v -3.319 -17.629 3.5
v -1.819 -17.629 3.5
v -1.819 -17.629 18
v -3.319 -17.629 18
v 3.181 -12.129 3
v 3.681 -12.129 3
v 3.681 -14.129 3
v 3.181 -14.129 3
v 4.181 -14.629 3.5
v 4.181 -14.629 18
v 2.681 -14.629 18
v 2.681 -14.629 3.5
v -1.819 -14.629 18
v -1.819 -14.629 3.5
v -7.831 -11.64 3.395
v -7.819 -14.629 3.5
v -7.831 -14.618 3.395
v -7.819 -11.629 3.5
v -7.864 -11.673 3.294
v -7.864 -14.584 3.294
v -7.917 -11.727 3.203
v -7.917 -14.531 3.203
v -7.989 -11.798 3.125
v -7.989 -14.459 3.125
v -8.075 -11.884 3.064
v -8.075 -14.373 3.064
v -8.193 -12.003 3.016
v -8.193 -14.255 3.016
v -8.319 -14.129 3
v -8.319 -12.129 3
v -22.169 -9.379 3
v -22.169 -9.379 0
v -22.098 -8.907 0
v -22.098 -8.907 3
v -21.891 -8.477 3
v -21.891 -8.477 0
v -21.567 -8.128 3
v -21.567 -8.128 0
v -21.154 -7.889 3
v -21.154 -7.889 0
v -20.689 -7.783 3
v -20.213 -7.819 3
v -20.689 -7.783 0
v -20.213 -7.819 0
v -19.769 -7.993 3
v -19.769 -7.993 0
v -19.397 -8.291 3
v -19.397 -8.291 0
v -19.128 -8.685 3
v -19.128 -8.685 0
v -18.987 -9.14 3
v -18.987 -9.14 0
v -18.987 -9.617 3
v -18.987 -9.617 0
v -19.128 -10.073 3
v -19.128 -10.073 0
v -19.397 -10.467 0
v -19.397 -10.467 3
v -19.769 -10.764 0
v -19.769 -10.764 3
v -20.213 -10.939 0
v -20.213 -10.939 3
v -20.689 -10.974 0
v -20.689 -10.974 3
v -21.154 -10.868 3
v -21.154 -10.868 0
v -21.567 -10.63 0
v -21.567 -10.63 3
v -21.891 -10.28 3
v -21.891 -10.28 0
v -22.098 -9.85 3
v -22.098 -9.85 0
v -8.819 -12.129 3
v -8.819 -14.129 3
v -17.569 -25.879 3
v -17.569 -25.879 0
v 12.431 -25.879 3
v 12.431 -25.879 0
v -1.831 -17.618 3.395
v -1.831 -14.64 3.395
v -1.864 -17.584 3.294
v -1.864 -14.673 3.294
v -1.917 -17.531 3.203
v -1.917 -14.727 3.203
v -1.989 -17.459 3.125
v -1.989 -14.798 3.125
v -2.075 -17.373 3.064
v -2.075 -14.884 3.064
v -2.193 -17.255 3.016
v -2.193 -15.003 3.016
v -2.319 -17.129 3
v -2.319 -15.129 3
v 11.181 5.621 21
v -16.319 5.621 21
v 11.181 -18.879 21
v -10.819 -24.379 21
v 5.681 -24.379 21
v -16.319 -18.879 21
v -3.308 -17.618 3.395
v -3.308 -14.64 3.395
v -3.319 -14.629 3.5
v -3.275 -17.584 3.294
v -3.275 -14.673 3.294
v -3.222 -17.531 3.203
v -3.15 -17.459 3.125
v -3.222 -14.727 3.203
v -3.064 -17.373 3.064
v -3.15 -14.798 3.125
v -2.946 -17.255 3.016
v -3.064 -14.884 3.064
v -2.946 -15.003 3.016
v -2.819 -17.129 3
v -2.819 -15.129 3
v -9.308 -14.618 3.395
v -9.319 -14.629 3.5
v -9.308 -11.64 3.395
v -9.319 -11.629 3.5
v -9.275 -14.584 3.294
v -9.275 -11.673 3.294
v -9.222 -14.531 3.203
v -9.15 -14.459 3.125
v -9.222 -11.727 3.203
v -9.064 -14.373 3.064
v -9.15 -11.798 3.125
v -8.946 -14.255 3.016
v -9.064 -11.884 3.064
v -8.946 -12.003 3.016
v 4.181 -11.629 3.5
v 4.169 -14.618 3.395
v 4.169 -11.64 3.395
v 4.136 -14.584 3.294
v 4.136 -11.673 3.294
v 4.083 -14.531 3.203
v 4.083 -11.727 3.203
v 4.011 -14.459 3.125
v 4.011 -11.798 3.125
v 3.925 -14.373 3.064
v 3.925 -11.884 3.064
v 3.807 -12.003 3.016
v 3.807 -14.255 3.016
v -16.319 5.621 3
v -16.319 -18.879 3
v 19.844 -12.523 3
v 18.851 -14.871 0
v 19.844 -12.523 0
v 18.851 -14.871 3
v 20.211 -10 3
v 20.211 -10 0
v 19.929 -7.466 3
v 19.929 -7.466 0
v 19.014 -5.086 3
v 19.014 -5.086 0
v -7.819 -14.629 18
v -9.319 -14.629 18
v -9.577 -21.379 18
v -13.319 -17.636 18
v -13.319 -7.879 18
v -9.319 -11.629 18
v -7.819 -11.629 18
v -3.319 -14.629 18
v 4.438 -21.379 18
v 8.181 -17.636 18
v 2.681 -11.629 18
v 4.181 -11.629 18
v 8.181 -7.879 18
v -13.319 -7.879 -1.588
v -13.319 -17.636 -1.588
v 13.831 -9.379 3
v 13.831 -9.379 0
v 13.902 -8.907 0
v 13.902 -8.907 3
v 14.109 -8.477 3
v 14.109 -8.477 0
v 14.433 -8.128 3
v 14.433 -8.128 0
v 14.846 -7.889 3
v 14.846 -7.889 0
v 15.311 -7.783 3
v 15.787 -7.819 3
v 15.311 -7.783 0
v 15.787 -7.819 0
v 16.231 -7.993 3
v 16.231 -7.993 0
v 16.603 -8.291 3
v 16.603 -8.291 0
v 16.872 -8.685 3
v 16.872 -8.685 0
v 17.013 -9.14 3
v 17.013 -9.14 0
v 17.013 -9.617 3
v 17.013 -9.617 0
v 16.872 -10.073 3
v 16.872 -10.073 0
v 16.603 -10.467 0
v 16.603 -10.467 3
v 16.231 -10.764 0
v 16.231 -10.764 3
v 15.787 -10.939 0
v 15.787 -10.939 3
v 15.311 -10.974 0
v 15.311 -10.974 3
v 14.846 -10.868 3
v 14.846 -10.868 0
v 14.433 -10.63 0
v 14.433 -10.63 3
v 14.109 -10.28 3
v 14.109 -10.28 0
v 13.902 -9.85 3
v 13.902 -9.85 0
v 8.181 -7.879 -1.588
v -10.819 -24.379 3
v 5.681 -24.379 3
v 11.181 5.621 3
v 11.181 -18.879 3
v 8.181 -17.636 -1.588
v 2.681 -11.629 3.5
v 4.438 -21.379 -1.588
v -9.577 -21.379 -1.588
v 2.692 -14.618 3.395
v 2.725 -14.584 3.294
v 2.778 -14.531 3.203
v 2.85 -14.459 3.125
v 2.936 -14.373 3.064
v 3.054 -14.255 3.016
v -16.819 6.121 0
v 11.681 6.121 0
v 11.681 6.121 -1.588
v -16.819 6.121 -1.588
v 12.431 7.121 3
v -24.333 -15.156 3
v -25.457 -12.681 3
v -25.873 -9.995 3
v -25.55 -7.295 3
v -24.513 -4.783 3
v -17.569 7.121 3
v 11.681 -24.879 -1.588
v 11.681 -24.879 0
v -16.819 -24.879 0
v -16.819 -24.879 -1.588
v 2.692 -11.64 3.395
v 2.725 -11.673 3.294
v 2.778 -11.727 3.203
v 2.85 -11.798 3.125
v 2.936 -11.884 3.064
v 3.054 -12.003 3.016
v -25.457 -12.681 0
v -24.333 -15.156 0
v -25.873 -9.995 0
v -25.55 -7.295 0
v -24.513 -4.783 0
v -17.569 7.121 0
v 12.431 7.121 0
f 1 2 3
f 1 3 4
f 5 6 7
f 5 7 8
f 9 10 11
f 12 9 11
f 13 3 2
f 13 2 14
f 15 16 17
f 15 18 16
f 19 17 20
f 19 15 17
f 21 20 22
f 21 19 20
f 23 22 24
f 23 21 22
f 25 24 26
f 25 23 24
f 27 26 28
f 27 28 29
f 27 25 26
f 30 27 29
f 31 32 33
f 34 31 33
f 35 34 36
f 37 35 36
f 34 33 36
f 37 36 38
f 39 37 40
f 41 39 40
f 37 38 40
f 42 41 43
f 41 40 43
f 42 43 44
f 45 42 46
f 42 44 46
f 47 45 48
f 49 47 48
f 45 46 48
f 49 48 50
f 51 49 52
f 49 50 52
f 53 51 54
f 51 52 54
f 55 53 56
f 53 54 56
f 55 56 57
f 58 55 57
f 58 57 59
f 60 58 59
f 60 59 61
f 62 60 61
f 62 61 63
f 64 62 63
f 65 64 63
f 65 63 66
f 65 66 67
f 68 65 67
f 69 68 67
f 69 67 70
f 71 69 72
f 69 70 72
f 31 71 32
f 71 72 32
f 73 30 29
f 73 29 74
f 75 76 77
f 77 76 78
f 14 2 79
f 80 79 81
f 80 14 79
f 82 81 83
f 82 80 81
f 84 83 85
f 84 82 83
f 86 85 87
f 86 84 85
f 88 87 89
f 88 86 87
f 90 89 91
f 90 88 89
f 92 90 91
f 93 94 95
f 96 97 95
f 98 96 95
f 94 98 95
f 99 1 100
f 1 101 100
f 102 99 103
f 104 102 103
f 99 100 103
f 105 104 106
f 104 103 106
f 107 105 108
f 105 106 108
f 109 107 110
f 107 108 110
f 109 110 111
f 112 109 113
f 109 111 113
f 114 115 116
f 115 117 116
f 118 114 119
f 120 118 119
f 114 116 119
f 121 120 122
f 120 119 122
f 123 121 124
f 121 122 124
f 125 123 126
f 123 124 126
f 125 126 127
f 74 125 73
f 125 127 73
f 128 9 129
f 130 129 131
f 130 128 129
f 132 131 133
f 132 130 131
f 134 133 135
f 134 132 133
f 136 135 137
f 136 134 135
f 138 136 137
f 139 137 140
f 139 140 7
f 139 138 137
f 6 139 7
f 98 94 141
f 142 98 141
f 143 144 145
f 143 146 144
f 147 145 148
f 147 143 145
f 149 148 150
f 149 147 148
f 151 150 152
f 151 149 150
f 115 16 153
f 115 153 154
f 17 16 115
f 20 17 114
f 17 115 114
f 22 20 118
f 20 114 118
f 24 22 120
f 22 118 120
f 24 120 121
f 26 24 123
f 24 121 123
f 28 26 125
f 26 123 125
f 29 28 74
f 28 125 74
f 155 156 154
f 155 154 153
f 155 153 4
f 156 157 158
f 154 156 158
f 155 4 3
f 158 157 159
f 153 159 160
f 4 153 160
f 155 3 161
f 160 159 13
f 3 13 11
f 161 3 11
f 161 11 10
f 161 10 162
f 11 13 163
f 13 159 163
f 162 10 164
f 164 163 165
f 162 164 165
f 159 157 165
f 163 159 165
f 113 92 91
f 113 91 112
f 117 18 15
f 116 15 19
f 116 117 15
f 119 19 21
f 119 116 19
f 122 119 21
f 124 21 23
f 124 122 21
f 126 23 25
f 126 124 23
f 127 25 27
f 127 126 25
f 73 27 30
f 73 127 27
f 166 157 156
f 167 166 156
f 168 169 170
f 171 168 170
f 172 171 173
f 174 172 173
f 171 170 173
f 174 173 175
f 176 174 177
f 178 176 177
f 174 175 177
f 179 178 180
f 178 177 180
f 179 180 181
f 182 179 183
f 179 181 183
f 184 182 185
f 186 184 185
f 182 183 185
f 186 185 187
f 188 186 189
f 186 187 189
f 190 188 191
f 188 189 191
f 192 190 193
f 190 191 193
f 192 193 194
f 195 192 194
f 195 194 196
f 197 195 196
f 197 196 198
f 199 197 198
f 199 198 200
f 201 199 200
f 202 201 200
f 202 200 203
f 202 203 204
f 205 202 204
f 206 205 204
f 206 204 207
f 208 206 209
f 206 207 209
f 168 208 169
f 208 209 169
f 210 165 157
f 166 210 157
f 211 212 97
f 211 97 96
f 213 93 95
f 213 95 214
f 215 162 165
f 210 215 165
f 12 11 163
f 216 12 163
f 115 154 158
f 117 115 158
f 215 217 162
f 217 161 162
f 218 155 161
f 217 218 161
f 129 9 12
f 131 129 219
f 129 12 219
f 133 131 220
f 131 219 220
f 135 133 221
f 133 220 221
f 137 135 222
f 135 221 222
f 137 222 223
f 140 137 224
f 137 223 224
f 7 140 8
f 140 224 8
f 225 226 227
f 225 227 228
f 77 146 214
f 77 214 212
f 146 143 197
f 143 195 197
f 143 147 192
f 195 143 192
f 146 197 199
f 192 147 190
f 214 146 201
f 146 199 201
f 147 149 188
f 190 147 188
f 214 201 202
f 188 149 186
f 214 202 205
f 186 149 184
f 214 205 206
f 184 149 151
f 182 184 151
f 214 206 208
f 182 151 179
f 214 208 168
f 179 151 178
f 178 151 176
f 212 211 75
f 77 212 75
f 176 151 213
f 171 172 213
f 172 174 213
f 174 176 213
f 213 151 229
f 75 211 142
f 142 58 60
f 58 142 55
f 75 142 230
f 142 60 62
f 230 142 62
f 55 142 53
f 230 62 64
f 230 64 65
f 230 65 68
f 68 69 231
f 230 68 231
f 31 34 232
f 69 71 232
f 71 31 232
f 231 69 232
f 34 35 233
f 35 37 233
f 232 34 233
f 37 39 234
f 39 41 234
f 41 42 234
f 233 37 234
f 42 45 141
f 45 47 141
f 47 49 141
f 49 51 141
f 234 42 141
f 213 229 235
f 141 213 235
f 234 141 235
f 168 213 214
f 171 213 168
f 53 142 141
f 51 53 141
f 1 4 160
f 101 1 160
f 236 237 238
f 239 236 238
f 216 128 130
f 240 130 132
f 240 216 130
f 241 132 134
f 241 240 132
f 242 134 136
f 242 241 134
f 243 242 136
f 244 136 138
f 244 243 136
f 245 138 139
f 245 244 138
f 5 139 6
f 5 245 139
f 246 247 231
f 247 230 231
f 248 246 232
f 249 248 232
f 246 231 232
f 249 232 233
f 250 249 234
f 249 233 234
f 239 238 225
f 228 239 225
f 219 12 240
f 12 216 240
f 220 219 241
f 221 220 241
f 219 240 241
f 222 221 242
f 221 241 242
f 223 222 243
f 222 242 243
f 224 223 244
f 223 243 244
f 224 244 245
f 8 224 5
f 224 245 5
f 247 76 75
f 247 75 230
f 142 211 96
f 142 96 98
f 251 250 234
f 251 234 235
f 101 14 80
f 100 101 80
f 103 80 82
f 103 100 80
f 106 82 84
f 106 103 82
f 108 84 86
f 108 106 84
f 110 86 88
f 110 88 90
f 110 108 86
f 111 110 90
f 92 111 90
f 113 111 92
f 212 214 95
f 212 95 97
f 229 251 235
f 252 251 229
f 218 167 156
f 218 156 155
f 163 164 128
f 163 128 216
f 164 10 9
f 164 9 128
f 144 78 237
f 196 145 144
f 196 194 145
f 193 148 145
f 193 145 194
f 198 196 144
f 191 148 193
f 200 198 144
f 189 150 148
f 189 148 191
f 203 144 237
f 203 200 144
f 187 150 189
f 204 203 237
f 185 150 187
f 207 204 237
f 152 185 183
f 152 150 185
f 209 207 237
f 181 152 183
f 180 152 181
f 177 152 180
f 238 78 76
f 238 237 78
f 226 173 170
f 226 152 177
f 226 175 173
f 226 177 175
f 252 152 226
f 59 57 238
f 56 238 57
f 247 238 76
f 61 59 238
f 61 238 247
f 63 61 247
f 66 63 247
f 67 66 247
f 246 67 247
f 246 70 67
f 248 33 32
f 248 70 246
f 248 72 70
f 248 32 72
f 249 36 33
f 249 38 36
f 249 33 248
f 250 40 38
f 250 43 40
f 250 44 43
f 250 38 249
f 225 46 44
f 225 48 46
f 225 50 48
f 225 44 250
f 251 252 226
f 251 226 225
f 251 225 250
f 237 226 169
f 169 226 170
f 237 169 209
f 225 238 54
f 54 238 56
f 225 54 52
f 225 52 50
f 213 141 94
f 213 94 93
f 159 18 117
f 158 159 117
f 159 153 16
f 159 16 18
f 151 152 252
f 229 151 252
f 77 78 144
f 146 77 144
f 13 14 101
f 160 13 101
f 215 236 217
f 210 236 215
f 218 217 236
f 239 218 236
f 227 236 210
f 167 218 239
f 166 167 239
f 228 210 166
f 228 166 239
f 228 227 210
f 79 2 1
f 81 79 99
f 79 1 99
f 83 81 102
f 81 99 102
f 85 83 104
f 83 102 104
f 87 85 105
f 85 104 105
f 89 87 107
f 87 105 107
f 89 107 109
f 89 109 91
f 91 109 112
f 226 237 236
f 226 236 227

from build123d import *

# Parameters (mm, degrees)
ESQUISSE1_W        = 30
ESQUISSE1_H        = 33
BOSS_EXTRU_1_DEPTH = 3
BOSS_EXTRU_2_DEPTH = 18
COQUE1_DEPTH       = 18
ESQUISSE3_W        = 1.5
ESQUISSE3_H        = 3
BOSS_EXTRU_3_DEPTH = 15
CONG_1_R           = 0.5
ESQUISSE4_W        = 27.5
ESQUISSE4_H        = 18
BOSS_EXTRU_4_DEPTH = 10.5
ESQUISSE6_R        = 1.6
BOSS_EXTRU_5_DEPTH = 3
CONG_2_R           = 10
ESQUISSE7_W        = 28.5
ESQUISSE7_H        = 31
BOSS_EXTRU_6_DEPTH = 1.5875


# Read off the part's stored shape, not the designer's step: Coque1
with BuildPart() as part:
    # Esquisse1 → Boss.-Extru.1 (new body)
    with BuildSketch(Plane.XY):
        with Locations((-2.569437515, -9.378787879)):
            Rectangle(ESQUISSE1_W, ESQUISSE1_H)
    extrude(amount=BOSS_EXTRU_1_DEPTH)

    # Esquisse2 → Boss.-Extru.2 (add)
    with BuildSketch(Plane.XY.offset(3)):
        Polygon((-16.319437515, -4.878787879), (11.180562485, -4.878787879), (11.180562485, -18.878787879), (5.680562485, -24.378787879), (-10.819437515, -24.378787879), (-16.319437515, -18.878787879), align=None)
    extrude(amount=BOSS_EXTRU_2_DEPTH)

    # Coque1 outline → Coque1 (cut)
    with BuildSketch(Plane.XY):
        Polygon((-13.319437515, -7.878787879), (-13.319437515, -17.636147192), (-9.576796827, -21.378787879), (4.437921798, -21.378787879), (8.180562485, -17.636147192), (8.180562485, -7.878787879), align=None)
    extrude(amount=COQUE1_DEPTH, mode=Mode.SUBTRACT)

    # Esquisse3 → Boss.-Extru.3 (add)
    with BuildSketch(Plane(origin=(0, 0, 18), x_dir=(-1, 0, 0), z_dir=(0, 0, -1))):
        with Locations((2.569437515, -16.128787879)):
            Rectangle(ESQUISSE3_W, ESQUISSE3_H)
        with Locations((-3.430562485, -13.128787879)):
            Rectangle(ESQUISSE3_W, ESQUISSE3_H)
        with Locations((8.569437515, -13.128787879)):
            Rectangle(ESQUISSE3_W, ESQUISSE3_H)
    extrude(amount=BOSS_EXTRU_3_DEPTH)

    # Congé1
    cong_1_edges = [part.edges().sort_by_distance(p)[0] for p in [
        (-1.819437515, -16.128787879, 3),
        (-2.569437515, -17.628787879, 3),
        (-3.319437515, -16.128787879, 3),
        (-2.569437515, -14.628787879, 3),
        (4.180562485, -13.128787879, 3),
        (3.430562485, -14.628787879, 3),
        (2.680562485, -13.128787879, 3),
        (3.430562485, -11.628787879, 3),
        (-7.819437515, -13.128787879, 3),
        (-8.569437515, -14.628787879, 3),
        (-9.319437515, -13.128787879, 3),
        (-8.569437515, -11.628787879, 3),
    ]]
    fillet(cong_1_edges, radius=CONG_1_R)

    # Esquisse4 → Boss.-Extru.4 (add)
    with BuildSketch(Plane(origin=(0, -4.878787879, 0), x_dir=(1, 0, 0), z_dir=(0, 1, 0))):
        with Locations((-2.569437515, -12)):
            Rectangle(ESQUISSE4_W, ESQUISSE4_H)
    extrude(amount=BOSS_EXTRU_4_DEPTH)

    # Esquisse6 → Boss.-Extru.5 (add)
    # profile 1 of 2: a face of its own
    with BuildSketch(Plane(origin=(0, 0, 0), x_dir=(-1, 0, 0), z_dir=(0, 0, -1))):
        Polygon((17.569437515, -25.878787879), (27.569437515, -10.024052208), (17.569437515, 7.121212121), align=None)
        with Locations((20.569437515, -9.378787879)):
            Circle(ESQUISSE6_R, mode=Mode.SUBTRACT)
    # profile 2 of 2: a face of its own
    with BuildSketch(Plane(origin=(0, 0, 0), x_dir=(-1, 0, 0), z_dir=(0, 0, -1))):
        Polygon((-12.430562485, 7.121212121), (-12.430562485, -25.878787879), (-21.677859795, -10.024052208), align=None)
        with Locations((-15.430562485, -9.378787879)):
            Circle(ESQUISSE6_R, mode=Mode.SUBTRACT)
    extrude(amount=-BOSS_EXTRU_5_DEPTH)

    # Congé2
    cong_2_edges = [part.edges().sort_by_distance(p)[0] for p in [
        (-27.569437515, -10.024052208, 1.5),
        (21.677859795, -10.024052208, 1.5),
    ]]
    fillet(cong_2_edges, radius=CONG_2_R)

    # Esquisse7 → Boss.-Extru.6 (add)
    with BuildSketch(Plane(origin=(0, 0, 0), x_dir=(-1, 0, 0), z_dir=(0, 0, -1))):
        with Locations((2.569437515, -9.378787879)):
            Rectangle(ESQUISSE7_W, ESQUISSE7_H)
        Polygon((-4.437921798, -21.378787879), (-8.180562485, -17.636147192), (-8.180562485, -7.878787879), (13.319437515, -7.878787879), (13.319437515, -17.636147192), (9.576796827, -21.378787879), align=None, mode=Mode.SUBTRACT)
    extrude(amount=BOSS_EXTRU_6_DEPTH)


solid = part.part
